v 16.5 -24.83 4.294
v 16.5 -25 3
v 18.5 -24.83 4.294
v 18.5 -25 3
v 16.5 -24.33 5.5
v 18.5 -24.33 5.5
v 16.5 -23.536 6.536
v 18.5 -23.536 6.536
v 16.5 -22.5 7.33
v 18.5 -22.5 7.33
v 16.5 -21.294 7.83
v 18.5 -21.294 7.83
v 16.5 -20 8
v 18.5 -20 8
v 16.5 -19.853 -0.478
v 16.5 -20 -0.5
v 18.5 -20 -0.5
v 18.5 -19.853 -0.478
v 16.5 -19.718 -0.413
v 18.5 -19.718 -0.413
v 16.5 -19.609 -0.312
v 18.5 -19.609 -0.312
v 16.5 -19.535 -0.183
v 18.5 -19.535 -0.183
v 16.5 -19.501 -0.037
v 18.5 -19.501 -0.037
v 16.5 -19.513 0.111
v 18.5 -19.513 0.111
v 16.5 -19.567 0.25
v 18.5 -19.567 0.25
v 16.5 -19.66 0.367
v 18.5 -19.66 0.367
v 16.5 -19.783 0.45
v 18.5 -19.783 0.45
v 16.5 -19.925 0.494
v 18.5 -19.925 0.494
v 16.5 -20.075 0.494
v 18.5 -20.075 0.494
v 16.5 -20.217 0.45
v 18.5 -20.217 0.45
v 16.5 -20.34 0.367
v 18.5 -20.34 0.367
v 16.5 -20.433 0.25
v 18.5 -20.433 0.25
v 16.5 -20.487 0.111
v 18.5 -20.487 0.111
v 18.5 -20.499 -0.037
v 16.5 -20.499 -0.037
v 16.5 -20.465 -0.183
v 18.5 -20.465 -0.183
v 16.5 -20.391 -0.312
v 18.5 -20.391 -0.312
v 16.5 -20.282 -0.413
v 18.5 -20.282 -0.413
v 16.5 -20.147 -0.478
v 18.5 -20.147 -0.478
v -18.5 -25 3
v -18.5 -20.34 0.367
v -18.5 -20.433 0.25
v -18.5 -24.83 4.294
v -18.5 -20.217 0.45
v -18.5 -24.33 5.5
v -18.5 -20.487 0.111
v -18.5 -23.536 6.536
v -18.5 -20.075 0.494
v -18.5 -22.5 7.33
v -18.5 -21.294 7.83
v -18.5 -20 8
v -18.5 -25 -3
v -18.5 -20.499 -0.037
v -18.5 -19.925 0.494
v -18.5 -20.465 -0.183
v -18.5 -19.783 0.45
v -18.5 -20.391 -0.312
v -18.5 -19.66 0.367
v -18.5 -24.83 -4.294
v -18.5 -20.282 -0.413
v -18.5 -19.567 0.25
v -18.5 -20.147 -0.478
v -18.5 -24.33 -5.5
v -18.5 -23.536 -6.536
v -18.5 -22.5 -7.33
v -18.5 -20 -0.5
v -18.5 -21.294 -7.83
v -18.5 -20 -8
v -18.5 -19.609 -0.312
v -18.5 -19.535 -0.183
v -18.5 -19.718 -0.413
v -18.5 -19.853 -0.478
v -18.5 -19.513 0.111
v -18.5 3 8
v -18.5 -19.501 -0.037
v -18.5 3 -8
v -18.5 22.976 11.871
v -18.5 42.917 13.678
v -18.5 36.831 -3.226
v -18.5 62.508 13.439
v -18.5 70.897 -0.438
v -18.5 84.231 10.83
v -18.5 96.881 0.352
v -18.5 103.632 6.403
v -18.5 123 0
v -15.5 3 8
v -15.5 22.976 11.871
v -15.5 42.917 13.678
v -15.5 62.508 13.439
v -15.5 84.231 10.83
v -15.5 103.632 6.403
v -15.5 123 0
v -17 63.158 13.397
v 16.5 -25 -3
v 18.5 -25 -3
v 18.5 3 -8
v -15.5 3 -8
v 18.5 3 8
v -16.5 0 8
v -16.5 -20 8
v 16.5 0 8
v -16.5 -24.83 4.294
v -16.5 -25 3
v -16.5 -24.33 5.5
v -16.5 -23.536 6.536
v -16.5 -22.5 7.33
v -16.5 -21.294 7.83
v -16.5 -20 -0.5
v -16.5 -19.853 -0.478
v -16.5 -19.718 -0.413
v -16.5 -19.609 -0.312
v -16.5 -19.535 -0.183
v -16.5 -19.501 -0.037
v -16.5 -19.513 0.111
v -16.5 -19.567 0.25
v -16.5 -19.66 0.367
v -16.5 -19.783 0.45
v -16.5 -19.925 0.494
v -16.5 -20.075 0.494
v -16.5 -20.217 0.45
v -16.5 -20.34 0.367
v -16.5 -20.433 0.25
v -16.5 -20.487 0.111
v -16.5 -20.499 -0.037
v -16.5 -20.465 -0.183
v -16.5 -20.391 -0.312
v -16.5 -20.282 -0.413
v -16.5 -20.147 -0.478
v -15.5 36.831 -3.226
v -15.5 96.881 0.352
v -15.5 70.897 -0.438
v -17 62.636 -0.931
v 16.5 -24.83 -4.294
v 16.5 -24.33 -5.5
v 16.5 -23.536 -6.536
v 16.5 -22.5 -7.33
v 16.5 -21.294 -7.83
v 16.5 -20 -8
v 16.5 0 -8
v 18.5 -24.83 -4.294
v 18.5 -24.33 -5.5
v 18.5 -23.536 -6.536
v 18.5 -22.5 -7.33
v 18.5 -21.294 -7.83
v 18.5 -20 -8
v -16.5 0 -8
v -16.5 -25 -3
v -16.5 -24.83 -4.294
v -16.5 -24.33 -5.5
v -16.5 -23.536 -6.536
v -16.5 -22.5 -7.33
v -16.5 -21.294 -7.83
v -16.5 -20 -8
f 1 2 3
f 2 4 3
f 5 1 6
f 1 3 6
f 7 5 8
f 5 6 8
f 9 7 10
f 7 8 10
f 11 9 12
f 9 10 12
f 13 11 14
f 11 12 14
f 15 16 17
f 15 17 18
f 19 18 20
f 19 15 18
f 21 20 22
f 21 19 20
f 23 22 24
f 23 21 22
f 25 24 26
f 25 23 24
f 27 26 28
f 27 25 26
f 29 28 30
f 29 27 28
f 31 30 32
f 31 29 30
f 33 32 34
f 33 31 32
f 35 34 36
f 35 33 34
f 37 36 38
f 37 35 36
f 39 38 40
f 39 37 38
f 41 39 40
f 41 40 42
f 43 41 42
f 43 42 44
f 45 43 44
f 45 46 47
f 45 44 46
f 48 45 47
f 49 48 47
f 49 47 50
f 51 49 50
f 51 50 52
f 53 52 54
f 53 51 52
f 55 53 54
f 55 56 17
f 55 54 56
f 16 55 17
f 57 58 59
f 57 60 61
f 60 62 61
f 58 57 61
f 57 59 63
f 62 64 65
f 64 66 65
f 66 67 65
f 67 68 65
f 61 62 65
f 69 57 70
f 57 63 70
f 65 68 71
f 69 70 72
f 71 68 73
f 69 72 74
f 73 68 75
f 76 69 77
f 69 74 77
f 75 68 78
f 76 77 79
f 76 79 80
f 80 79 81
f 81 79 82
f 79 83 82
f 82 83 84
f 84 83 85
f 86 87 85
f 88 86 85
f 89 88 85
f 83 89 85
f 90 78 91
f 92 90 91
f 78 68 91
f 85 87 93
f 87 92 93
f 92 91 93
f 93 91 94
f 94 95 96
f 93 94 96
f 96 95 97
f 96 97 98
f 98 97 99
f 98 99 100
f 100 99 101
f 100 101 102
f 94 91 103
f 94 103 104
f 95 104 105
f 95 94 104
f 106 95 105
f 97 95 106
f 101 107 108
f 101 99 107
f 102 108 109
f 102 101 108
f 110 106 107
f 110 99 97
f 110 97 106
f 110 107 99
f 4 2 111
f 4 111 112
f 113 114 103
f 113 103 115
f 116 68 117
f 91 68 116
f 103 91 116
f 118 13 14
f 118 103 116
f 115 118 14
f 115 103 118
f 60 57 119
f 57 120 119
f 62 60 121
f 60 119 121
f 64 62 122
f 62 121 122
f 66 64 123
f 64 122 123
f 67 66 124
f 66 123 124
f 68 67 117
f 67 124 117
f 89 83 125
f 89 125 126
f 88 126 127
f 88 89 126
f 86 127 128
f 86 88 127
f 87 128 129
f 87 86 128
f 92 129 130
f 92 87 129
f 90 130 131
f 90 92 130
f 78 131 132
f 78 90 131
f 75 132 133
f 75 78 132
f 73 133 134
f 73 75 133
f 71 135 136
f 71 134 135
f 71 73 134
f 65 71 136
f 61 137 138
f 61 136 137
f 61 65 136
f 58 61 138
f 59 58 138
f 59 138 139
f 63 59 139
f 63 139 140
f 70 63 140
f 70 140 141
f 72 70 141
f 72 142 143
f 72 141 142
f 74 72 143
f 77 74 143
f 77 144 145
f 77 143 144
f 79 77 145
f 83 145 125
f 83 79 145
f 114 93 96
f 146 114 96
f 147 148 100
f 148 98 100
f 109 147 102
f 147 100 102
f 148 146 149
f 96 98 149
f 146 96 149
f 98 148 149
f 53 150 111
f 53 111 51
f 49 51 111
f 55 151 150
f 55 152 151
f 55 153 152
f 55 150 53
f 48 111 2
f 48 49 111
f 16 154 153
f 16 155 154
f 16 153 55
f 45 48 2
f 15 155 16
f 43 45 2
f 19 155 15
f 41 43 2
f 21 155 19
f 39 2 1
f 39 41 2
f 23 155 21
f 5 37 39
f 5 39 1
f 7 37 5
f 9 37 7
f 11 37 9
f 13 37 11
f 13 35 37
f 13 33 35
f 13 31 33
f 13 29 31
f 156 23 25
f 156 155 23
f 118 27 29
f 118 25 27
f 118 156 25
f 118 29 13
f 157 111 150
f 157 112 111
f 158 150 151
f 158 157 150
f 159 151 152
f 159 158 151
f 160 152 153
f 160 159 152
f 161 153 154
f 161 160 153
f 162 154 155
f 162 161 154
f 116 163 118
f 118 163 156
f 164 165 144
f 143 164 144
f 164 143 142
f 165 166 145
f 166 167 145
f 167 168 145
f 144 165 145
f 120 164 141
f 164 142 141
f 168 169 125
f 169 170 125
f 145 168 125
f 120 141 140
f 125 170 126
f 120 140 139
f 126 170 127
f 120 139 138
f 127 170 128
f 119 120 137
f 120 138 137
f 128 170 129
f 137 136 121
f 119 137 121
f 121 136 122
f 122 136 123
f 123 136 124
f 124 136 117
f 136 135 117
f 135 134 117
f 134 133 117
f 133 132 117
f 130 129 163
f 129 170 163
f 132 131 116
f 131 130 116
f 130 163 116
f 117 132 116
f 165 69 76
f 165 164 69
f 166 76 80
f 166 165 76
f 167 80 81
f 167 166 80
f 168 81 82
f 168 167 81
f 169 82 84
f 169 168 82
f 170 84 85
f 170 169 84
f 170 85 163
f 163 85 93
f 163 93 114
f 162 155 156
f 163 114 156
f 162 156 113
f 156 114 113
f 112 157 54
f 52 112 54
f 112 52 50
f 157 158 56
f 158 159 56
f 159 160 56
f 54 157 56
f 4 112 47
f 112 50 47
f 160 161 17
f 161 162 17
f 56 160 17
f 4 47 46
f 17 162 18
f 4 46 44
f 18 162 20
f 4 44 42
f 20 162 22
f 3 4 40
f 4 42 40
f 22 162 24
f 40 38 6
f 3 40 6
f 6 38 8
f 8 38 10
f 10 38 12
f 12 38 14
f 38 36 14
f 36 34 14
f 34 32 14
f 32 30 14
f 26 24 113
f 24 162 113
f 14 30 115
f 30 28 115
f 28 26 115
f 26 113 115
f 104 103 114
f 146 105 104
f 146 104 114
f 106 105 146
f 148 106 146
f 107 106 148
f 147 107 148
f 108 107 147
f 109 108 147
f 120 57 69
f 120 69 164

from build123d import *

# Parameters (mm, degrees)
SKETCH1_W               = 37
SKETCH1_H               = 16
BOSS_EXTRUDE1_DEPTH     = 3
SKETCH2_W               = 2
SKETCH2_H               = 16
BOSS_EXTRUDE2_DEPTH     = 25
FILLET1_R               = 5
CUT_EXTRUDE1_DEPTH      = 46.365184889
CUT_EXTRUDE1_DEPTH_BACK = 46.365184889
SKETCH3_R               = 0.5
BOSS_EXTRUDE3_DEPTH     = 3


with BuildPart() as part:
    # Sketch1 → Boss-Extrude1 (new body)
    with BuildSketch(Plane(origin=(0, 0, 0), x_dir=(1, 0, 0), z_dir=(0, 1, 0))):
        Rectangle(SKETCH1_W, SKETCH1_H)
    extrude(amount=BOSS_EXTRUDE1_DEPTH)

    # Sketch2 → Boss-Extrude2 (add)
    with BuildSketch(Plane.XZ):
        with Locations((17.5, 0)):
            Rectangle(SKETCH2_W, SKETCH2_H)
        with Locations((-17.5, 0)):
            Rectangle(SKETCH2_W, SKETCH2_H)
    extrude(amount=BOSS_EXTRUDE2_DEPTH)

    # Fillet1
    fillet1_edges = [part.edges().sort_by_distance(p)[0] for p in [
        (17.5, -25, 8),
        (17.5, -25, -8),
        (-17.5, -25, -8),
        (-17.5, -25, 8),
    ]]
    fillet(fillet1_edges, radius=FILLET1_R)

    # Sketch3 → Cut-Extrude1 (cut, two sides: drawn at the far end of the back side and taken through both)
    with BuildSketch(Plane(origin=(18.5, 0, 0), x_dir=(0, 0, -1), z_dir=(1, 0, 0)).offset(-CUT_EXTRUDE1_DEPTH_BACK)):
        with Locations((0, -20)):
            Circle(SKETCH3_R)
    extrude(amount=CUT_EXTRUDE1_DEPTH + CUT_EXTRUDE1_DEPTH_BACK, mode=Mode.SUBTRACT)

    # Sketch4 → Boss-Extrude3 (add)
    with BuildSketch(Plane.ZY.offset(18.5)):
        with BuildLine():
            Line((8, 3), (-8, 3))
            add(Edge.make_bspline(
                [(-8, 3), (2.138723357, 62.272306254), (0, 123)],
                knots=[0, 0, 0, 1, 1, 1], degree=2))
            add(Edge.make_bspline(
                [(8, 3), (22.794261884, 63.3166085), (0, 123)],
                knots=[0, 0, 0, 1, 1, 1], degree=2))
        make_face()
    extrude(amount=-BOSS_EXTRUDE3_DEPTH)


solid = part.part
